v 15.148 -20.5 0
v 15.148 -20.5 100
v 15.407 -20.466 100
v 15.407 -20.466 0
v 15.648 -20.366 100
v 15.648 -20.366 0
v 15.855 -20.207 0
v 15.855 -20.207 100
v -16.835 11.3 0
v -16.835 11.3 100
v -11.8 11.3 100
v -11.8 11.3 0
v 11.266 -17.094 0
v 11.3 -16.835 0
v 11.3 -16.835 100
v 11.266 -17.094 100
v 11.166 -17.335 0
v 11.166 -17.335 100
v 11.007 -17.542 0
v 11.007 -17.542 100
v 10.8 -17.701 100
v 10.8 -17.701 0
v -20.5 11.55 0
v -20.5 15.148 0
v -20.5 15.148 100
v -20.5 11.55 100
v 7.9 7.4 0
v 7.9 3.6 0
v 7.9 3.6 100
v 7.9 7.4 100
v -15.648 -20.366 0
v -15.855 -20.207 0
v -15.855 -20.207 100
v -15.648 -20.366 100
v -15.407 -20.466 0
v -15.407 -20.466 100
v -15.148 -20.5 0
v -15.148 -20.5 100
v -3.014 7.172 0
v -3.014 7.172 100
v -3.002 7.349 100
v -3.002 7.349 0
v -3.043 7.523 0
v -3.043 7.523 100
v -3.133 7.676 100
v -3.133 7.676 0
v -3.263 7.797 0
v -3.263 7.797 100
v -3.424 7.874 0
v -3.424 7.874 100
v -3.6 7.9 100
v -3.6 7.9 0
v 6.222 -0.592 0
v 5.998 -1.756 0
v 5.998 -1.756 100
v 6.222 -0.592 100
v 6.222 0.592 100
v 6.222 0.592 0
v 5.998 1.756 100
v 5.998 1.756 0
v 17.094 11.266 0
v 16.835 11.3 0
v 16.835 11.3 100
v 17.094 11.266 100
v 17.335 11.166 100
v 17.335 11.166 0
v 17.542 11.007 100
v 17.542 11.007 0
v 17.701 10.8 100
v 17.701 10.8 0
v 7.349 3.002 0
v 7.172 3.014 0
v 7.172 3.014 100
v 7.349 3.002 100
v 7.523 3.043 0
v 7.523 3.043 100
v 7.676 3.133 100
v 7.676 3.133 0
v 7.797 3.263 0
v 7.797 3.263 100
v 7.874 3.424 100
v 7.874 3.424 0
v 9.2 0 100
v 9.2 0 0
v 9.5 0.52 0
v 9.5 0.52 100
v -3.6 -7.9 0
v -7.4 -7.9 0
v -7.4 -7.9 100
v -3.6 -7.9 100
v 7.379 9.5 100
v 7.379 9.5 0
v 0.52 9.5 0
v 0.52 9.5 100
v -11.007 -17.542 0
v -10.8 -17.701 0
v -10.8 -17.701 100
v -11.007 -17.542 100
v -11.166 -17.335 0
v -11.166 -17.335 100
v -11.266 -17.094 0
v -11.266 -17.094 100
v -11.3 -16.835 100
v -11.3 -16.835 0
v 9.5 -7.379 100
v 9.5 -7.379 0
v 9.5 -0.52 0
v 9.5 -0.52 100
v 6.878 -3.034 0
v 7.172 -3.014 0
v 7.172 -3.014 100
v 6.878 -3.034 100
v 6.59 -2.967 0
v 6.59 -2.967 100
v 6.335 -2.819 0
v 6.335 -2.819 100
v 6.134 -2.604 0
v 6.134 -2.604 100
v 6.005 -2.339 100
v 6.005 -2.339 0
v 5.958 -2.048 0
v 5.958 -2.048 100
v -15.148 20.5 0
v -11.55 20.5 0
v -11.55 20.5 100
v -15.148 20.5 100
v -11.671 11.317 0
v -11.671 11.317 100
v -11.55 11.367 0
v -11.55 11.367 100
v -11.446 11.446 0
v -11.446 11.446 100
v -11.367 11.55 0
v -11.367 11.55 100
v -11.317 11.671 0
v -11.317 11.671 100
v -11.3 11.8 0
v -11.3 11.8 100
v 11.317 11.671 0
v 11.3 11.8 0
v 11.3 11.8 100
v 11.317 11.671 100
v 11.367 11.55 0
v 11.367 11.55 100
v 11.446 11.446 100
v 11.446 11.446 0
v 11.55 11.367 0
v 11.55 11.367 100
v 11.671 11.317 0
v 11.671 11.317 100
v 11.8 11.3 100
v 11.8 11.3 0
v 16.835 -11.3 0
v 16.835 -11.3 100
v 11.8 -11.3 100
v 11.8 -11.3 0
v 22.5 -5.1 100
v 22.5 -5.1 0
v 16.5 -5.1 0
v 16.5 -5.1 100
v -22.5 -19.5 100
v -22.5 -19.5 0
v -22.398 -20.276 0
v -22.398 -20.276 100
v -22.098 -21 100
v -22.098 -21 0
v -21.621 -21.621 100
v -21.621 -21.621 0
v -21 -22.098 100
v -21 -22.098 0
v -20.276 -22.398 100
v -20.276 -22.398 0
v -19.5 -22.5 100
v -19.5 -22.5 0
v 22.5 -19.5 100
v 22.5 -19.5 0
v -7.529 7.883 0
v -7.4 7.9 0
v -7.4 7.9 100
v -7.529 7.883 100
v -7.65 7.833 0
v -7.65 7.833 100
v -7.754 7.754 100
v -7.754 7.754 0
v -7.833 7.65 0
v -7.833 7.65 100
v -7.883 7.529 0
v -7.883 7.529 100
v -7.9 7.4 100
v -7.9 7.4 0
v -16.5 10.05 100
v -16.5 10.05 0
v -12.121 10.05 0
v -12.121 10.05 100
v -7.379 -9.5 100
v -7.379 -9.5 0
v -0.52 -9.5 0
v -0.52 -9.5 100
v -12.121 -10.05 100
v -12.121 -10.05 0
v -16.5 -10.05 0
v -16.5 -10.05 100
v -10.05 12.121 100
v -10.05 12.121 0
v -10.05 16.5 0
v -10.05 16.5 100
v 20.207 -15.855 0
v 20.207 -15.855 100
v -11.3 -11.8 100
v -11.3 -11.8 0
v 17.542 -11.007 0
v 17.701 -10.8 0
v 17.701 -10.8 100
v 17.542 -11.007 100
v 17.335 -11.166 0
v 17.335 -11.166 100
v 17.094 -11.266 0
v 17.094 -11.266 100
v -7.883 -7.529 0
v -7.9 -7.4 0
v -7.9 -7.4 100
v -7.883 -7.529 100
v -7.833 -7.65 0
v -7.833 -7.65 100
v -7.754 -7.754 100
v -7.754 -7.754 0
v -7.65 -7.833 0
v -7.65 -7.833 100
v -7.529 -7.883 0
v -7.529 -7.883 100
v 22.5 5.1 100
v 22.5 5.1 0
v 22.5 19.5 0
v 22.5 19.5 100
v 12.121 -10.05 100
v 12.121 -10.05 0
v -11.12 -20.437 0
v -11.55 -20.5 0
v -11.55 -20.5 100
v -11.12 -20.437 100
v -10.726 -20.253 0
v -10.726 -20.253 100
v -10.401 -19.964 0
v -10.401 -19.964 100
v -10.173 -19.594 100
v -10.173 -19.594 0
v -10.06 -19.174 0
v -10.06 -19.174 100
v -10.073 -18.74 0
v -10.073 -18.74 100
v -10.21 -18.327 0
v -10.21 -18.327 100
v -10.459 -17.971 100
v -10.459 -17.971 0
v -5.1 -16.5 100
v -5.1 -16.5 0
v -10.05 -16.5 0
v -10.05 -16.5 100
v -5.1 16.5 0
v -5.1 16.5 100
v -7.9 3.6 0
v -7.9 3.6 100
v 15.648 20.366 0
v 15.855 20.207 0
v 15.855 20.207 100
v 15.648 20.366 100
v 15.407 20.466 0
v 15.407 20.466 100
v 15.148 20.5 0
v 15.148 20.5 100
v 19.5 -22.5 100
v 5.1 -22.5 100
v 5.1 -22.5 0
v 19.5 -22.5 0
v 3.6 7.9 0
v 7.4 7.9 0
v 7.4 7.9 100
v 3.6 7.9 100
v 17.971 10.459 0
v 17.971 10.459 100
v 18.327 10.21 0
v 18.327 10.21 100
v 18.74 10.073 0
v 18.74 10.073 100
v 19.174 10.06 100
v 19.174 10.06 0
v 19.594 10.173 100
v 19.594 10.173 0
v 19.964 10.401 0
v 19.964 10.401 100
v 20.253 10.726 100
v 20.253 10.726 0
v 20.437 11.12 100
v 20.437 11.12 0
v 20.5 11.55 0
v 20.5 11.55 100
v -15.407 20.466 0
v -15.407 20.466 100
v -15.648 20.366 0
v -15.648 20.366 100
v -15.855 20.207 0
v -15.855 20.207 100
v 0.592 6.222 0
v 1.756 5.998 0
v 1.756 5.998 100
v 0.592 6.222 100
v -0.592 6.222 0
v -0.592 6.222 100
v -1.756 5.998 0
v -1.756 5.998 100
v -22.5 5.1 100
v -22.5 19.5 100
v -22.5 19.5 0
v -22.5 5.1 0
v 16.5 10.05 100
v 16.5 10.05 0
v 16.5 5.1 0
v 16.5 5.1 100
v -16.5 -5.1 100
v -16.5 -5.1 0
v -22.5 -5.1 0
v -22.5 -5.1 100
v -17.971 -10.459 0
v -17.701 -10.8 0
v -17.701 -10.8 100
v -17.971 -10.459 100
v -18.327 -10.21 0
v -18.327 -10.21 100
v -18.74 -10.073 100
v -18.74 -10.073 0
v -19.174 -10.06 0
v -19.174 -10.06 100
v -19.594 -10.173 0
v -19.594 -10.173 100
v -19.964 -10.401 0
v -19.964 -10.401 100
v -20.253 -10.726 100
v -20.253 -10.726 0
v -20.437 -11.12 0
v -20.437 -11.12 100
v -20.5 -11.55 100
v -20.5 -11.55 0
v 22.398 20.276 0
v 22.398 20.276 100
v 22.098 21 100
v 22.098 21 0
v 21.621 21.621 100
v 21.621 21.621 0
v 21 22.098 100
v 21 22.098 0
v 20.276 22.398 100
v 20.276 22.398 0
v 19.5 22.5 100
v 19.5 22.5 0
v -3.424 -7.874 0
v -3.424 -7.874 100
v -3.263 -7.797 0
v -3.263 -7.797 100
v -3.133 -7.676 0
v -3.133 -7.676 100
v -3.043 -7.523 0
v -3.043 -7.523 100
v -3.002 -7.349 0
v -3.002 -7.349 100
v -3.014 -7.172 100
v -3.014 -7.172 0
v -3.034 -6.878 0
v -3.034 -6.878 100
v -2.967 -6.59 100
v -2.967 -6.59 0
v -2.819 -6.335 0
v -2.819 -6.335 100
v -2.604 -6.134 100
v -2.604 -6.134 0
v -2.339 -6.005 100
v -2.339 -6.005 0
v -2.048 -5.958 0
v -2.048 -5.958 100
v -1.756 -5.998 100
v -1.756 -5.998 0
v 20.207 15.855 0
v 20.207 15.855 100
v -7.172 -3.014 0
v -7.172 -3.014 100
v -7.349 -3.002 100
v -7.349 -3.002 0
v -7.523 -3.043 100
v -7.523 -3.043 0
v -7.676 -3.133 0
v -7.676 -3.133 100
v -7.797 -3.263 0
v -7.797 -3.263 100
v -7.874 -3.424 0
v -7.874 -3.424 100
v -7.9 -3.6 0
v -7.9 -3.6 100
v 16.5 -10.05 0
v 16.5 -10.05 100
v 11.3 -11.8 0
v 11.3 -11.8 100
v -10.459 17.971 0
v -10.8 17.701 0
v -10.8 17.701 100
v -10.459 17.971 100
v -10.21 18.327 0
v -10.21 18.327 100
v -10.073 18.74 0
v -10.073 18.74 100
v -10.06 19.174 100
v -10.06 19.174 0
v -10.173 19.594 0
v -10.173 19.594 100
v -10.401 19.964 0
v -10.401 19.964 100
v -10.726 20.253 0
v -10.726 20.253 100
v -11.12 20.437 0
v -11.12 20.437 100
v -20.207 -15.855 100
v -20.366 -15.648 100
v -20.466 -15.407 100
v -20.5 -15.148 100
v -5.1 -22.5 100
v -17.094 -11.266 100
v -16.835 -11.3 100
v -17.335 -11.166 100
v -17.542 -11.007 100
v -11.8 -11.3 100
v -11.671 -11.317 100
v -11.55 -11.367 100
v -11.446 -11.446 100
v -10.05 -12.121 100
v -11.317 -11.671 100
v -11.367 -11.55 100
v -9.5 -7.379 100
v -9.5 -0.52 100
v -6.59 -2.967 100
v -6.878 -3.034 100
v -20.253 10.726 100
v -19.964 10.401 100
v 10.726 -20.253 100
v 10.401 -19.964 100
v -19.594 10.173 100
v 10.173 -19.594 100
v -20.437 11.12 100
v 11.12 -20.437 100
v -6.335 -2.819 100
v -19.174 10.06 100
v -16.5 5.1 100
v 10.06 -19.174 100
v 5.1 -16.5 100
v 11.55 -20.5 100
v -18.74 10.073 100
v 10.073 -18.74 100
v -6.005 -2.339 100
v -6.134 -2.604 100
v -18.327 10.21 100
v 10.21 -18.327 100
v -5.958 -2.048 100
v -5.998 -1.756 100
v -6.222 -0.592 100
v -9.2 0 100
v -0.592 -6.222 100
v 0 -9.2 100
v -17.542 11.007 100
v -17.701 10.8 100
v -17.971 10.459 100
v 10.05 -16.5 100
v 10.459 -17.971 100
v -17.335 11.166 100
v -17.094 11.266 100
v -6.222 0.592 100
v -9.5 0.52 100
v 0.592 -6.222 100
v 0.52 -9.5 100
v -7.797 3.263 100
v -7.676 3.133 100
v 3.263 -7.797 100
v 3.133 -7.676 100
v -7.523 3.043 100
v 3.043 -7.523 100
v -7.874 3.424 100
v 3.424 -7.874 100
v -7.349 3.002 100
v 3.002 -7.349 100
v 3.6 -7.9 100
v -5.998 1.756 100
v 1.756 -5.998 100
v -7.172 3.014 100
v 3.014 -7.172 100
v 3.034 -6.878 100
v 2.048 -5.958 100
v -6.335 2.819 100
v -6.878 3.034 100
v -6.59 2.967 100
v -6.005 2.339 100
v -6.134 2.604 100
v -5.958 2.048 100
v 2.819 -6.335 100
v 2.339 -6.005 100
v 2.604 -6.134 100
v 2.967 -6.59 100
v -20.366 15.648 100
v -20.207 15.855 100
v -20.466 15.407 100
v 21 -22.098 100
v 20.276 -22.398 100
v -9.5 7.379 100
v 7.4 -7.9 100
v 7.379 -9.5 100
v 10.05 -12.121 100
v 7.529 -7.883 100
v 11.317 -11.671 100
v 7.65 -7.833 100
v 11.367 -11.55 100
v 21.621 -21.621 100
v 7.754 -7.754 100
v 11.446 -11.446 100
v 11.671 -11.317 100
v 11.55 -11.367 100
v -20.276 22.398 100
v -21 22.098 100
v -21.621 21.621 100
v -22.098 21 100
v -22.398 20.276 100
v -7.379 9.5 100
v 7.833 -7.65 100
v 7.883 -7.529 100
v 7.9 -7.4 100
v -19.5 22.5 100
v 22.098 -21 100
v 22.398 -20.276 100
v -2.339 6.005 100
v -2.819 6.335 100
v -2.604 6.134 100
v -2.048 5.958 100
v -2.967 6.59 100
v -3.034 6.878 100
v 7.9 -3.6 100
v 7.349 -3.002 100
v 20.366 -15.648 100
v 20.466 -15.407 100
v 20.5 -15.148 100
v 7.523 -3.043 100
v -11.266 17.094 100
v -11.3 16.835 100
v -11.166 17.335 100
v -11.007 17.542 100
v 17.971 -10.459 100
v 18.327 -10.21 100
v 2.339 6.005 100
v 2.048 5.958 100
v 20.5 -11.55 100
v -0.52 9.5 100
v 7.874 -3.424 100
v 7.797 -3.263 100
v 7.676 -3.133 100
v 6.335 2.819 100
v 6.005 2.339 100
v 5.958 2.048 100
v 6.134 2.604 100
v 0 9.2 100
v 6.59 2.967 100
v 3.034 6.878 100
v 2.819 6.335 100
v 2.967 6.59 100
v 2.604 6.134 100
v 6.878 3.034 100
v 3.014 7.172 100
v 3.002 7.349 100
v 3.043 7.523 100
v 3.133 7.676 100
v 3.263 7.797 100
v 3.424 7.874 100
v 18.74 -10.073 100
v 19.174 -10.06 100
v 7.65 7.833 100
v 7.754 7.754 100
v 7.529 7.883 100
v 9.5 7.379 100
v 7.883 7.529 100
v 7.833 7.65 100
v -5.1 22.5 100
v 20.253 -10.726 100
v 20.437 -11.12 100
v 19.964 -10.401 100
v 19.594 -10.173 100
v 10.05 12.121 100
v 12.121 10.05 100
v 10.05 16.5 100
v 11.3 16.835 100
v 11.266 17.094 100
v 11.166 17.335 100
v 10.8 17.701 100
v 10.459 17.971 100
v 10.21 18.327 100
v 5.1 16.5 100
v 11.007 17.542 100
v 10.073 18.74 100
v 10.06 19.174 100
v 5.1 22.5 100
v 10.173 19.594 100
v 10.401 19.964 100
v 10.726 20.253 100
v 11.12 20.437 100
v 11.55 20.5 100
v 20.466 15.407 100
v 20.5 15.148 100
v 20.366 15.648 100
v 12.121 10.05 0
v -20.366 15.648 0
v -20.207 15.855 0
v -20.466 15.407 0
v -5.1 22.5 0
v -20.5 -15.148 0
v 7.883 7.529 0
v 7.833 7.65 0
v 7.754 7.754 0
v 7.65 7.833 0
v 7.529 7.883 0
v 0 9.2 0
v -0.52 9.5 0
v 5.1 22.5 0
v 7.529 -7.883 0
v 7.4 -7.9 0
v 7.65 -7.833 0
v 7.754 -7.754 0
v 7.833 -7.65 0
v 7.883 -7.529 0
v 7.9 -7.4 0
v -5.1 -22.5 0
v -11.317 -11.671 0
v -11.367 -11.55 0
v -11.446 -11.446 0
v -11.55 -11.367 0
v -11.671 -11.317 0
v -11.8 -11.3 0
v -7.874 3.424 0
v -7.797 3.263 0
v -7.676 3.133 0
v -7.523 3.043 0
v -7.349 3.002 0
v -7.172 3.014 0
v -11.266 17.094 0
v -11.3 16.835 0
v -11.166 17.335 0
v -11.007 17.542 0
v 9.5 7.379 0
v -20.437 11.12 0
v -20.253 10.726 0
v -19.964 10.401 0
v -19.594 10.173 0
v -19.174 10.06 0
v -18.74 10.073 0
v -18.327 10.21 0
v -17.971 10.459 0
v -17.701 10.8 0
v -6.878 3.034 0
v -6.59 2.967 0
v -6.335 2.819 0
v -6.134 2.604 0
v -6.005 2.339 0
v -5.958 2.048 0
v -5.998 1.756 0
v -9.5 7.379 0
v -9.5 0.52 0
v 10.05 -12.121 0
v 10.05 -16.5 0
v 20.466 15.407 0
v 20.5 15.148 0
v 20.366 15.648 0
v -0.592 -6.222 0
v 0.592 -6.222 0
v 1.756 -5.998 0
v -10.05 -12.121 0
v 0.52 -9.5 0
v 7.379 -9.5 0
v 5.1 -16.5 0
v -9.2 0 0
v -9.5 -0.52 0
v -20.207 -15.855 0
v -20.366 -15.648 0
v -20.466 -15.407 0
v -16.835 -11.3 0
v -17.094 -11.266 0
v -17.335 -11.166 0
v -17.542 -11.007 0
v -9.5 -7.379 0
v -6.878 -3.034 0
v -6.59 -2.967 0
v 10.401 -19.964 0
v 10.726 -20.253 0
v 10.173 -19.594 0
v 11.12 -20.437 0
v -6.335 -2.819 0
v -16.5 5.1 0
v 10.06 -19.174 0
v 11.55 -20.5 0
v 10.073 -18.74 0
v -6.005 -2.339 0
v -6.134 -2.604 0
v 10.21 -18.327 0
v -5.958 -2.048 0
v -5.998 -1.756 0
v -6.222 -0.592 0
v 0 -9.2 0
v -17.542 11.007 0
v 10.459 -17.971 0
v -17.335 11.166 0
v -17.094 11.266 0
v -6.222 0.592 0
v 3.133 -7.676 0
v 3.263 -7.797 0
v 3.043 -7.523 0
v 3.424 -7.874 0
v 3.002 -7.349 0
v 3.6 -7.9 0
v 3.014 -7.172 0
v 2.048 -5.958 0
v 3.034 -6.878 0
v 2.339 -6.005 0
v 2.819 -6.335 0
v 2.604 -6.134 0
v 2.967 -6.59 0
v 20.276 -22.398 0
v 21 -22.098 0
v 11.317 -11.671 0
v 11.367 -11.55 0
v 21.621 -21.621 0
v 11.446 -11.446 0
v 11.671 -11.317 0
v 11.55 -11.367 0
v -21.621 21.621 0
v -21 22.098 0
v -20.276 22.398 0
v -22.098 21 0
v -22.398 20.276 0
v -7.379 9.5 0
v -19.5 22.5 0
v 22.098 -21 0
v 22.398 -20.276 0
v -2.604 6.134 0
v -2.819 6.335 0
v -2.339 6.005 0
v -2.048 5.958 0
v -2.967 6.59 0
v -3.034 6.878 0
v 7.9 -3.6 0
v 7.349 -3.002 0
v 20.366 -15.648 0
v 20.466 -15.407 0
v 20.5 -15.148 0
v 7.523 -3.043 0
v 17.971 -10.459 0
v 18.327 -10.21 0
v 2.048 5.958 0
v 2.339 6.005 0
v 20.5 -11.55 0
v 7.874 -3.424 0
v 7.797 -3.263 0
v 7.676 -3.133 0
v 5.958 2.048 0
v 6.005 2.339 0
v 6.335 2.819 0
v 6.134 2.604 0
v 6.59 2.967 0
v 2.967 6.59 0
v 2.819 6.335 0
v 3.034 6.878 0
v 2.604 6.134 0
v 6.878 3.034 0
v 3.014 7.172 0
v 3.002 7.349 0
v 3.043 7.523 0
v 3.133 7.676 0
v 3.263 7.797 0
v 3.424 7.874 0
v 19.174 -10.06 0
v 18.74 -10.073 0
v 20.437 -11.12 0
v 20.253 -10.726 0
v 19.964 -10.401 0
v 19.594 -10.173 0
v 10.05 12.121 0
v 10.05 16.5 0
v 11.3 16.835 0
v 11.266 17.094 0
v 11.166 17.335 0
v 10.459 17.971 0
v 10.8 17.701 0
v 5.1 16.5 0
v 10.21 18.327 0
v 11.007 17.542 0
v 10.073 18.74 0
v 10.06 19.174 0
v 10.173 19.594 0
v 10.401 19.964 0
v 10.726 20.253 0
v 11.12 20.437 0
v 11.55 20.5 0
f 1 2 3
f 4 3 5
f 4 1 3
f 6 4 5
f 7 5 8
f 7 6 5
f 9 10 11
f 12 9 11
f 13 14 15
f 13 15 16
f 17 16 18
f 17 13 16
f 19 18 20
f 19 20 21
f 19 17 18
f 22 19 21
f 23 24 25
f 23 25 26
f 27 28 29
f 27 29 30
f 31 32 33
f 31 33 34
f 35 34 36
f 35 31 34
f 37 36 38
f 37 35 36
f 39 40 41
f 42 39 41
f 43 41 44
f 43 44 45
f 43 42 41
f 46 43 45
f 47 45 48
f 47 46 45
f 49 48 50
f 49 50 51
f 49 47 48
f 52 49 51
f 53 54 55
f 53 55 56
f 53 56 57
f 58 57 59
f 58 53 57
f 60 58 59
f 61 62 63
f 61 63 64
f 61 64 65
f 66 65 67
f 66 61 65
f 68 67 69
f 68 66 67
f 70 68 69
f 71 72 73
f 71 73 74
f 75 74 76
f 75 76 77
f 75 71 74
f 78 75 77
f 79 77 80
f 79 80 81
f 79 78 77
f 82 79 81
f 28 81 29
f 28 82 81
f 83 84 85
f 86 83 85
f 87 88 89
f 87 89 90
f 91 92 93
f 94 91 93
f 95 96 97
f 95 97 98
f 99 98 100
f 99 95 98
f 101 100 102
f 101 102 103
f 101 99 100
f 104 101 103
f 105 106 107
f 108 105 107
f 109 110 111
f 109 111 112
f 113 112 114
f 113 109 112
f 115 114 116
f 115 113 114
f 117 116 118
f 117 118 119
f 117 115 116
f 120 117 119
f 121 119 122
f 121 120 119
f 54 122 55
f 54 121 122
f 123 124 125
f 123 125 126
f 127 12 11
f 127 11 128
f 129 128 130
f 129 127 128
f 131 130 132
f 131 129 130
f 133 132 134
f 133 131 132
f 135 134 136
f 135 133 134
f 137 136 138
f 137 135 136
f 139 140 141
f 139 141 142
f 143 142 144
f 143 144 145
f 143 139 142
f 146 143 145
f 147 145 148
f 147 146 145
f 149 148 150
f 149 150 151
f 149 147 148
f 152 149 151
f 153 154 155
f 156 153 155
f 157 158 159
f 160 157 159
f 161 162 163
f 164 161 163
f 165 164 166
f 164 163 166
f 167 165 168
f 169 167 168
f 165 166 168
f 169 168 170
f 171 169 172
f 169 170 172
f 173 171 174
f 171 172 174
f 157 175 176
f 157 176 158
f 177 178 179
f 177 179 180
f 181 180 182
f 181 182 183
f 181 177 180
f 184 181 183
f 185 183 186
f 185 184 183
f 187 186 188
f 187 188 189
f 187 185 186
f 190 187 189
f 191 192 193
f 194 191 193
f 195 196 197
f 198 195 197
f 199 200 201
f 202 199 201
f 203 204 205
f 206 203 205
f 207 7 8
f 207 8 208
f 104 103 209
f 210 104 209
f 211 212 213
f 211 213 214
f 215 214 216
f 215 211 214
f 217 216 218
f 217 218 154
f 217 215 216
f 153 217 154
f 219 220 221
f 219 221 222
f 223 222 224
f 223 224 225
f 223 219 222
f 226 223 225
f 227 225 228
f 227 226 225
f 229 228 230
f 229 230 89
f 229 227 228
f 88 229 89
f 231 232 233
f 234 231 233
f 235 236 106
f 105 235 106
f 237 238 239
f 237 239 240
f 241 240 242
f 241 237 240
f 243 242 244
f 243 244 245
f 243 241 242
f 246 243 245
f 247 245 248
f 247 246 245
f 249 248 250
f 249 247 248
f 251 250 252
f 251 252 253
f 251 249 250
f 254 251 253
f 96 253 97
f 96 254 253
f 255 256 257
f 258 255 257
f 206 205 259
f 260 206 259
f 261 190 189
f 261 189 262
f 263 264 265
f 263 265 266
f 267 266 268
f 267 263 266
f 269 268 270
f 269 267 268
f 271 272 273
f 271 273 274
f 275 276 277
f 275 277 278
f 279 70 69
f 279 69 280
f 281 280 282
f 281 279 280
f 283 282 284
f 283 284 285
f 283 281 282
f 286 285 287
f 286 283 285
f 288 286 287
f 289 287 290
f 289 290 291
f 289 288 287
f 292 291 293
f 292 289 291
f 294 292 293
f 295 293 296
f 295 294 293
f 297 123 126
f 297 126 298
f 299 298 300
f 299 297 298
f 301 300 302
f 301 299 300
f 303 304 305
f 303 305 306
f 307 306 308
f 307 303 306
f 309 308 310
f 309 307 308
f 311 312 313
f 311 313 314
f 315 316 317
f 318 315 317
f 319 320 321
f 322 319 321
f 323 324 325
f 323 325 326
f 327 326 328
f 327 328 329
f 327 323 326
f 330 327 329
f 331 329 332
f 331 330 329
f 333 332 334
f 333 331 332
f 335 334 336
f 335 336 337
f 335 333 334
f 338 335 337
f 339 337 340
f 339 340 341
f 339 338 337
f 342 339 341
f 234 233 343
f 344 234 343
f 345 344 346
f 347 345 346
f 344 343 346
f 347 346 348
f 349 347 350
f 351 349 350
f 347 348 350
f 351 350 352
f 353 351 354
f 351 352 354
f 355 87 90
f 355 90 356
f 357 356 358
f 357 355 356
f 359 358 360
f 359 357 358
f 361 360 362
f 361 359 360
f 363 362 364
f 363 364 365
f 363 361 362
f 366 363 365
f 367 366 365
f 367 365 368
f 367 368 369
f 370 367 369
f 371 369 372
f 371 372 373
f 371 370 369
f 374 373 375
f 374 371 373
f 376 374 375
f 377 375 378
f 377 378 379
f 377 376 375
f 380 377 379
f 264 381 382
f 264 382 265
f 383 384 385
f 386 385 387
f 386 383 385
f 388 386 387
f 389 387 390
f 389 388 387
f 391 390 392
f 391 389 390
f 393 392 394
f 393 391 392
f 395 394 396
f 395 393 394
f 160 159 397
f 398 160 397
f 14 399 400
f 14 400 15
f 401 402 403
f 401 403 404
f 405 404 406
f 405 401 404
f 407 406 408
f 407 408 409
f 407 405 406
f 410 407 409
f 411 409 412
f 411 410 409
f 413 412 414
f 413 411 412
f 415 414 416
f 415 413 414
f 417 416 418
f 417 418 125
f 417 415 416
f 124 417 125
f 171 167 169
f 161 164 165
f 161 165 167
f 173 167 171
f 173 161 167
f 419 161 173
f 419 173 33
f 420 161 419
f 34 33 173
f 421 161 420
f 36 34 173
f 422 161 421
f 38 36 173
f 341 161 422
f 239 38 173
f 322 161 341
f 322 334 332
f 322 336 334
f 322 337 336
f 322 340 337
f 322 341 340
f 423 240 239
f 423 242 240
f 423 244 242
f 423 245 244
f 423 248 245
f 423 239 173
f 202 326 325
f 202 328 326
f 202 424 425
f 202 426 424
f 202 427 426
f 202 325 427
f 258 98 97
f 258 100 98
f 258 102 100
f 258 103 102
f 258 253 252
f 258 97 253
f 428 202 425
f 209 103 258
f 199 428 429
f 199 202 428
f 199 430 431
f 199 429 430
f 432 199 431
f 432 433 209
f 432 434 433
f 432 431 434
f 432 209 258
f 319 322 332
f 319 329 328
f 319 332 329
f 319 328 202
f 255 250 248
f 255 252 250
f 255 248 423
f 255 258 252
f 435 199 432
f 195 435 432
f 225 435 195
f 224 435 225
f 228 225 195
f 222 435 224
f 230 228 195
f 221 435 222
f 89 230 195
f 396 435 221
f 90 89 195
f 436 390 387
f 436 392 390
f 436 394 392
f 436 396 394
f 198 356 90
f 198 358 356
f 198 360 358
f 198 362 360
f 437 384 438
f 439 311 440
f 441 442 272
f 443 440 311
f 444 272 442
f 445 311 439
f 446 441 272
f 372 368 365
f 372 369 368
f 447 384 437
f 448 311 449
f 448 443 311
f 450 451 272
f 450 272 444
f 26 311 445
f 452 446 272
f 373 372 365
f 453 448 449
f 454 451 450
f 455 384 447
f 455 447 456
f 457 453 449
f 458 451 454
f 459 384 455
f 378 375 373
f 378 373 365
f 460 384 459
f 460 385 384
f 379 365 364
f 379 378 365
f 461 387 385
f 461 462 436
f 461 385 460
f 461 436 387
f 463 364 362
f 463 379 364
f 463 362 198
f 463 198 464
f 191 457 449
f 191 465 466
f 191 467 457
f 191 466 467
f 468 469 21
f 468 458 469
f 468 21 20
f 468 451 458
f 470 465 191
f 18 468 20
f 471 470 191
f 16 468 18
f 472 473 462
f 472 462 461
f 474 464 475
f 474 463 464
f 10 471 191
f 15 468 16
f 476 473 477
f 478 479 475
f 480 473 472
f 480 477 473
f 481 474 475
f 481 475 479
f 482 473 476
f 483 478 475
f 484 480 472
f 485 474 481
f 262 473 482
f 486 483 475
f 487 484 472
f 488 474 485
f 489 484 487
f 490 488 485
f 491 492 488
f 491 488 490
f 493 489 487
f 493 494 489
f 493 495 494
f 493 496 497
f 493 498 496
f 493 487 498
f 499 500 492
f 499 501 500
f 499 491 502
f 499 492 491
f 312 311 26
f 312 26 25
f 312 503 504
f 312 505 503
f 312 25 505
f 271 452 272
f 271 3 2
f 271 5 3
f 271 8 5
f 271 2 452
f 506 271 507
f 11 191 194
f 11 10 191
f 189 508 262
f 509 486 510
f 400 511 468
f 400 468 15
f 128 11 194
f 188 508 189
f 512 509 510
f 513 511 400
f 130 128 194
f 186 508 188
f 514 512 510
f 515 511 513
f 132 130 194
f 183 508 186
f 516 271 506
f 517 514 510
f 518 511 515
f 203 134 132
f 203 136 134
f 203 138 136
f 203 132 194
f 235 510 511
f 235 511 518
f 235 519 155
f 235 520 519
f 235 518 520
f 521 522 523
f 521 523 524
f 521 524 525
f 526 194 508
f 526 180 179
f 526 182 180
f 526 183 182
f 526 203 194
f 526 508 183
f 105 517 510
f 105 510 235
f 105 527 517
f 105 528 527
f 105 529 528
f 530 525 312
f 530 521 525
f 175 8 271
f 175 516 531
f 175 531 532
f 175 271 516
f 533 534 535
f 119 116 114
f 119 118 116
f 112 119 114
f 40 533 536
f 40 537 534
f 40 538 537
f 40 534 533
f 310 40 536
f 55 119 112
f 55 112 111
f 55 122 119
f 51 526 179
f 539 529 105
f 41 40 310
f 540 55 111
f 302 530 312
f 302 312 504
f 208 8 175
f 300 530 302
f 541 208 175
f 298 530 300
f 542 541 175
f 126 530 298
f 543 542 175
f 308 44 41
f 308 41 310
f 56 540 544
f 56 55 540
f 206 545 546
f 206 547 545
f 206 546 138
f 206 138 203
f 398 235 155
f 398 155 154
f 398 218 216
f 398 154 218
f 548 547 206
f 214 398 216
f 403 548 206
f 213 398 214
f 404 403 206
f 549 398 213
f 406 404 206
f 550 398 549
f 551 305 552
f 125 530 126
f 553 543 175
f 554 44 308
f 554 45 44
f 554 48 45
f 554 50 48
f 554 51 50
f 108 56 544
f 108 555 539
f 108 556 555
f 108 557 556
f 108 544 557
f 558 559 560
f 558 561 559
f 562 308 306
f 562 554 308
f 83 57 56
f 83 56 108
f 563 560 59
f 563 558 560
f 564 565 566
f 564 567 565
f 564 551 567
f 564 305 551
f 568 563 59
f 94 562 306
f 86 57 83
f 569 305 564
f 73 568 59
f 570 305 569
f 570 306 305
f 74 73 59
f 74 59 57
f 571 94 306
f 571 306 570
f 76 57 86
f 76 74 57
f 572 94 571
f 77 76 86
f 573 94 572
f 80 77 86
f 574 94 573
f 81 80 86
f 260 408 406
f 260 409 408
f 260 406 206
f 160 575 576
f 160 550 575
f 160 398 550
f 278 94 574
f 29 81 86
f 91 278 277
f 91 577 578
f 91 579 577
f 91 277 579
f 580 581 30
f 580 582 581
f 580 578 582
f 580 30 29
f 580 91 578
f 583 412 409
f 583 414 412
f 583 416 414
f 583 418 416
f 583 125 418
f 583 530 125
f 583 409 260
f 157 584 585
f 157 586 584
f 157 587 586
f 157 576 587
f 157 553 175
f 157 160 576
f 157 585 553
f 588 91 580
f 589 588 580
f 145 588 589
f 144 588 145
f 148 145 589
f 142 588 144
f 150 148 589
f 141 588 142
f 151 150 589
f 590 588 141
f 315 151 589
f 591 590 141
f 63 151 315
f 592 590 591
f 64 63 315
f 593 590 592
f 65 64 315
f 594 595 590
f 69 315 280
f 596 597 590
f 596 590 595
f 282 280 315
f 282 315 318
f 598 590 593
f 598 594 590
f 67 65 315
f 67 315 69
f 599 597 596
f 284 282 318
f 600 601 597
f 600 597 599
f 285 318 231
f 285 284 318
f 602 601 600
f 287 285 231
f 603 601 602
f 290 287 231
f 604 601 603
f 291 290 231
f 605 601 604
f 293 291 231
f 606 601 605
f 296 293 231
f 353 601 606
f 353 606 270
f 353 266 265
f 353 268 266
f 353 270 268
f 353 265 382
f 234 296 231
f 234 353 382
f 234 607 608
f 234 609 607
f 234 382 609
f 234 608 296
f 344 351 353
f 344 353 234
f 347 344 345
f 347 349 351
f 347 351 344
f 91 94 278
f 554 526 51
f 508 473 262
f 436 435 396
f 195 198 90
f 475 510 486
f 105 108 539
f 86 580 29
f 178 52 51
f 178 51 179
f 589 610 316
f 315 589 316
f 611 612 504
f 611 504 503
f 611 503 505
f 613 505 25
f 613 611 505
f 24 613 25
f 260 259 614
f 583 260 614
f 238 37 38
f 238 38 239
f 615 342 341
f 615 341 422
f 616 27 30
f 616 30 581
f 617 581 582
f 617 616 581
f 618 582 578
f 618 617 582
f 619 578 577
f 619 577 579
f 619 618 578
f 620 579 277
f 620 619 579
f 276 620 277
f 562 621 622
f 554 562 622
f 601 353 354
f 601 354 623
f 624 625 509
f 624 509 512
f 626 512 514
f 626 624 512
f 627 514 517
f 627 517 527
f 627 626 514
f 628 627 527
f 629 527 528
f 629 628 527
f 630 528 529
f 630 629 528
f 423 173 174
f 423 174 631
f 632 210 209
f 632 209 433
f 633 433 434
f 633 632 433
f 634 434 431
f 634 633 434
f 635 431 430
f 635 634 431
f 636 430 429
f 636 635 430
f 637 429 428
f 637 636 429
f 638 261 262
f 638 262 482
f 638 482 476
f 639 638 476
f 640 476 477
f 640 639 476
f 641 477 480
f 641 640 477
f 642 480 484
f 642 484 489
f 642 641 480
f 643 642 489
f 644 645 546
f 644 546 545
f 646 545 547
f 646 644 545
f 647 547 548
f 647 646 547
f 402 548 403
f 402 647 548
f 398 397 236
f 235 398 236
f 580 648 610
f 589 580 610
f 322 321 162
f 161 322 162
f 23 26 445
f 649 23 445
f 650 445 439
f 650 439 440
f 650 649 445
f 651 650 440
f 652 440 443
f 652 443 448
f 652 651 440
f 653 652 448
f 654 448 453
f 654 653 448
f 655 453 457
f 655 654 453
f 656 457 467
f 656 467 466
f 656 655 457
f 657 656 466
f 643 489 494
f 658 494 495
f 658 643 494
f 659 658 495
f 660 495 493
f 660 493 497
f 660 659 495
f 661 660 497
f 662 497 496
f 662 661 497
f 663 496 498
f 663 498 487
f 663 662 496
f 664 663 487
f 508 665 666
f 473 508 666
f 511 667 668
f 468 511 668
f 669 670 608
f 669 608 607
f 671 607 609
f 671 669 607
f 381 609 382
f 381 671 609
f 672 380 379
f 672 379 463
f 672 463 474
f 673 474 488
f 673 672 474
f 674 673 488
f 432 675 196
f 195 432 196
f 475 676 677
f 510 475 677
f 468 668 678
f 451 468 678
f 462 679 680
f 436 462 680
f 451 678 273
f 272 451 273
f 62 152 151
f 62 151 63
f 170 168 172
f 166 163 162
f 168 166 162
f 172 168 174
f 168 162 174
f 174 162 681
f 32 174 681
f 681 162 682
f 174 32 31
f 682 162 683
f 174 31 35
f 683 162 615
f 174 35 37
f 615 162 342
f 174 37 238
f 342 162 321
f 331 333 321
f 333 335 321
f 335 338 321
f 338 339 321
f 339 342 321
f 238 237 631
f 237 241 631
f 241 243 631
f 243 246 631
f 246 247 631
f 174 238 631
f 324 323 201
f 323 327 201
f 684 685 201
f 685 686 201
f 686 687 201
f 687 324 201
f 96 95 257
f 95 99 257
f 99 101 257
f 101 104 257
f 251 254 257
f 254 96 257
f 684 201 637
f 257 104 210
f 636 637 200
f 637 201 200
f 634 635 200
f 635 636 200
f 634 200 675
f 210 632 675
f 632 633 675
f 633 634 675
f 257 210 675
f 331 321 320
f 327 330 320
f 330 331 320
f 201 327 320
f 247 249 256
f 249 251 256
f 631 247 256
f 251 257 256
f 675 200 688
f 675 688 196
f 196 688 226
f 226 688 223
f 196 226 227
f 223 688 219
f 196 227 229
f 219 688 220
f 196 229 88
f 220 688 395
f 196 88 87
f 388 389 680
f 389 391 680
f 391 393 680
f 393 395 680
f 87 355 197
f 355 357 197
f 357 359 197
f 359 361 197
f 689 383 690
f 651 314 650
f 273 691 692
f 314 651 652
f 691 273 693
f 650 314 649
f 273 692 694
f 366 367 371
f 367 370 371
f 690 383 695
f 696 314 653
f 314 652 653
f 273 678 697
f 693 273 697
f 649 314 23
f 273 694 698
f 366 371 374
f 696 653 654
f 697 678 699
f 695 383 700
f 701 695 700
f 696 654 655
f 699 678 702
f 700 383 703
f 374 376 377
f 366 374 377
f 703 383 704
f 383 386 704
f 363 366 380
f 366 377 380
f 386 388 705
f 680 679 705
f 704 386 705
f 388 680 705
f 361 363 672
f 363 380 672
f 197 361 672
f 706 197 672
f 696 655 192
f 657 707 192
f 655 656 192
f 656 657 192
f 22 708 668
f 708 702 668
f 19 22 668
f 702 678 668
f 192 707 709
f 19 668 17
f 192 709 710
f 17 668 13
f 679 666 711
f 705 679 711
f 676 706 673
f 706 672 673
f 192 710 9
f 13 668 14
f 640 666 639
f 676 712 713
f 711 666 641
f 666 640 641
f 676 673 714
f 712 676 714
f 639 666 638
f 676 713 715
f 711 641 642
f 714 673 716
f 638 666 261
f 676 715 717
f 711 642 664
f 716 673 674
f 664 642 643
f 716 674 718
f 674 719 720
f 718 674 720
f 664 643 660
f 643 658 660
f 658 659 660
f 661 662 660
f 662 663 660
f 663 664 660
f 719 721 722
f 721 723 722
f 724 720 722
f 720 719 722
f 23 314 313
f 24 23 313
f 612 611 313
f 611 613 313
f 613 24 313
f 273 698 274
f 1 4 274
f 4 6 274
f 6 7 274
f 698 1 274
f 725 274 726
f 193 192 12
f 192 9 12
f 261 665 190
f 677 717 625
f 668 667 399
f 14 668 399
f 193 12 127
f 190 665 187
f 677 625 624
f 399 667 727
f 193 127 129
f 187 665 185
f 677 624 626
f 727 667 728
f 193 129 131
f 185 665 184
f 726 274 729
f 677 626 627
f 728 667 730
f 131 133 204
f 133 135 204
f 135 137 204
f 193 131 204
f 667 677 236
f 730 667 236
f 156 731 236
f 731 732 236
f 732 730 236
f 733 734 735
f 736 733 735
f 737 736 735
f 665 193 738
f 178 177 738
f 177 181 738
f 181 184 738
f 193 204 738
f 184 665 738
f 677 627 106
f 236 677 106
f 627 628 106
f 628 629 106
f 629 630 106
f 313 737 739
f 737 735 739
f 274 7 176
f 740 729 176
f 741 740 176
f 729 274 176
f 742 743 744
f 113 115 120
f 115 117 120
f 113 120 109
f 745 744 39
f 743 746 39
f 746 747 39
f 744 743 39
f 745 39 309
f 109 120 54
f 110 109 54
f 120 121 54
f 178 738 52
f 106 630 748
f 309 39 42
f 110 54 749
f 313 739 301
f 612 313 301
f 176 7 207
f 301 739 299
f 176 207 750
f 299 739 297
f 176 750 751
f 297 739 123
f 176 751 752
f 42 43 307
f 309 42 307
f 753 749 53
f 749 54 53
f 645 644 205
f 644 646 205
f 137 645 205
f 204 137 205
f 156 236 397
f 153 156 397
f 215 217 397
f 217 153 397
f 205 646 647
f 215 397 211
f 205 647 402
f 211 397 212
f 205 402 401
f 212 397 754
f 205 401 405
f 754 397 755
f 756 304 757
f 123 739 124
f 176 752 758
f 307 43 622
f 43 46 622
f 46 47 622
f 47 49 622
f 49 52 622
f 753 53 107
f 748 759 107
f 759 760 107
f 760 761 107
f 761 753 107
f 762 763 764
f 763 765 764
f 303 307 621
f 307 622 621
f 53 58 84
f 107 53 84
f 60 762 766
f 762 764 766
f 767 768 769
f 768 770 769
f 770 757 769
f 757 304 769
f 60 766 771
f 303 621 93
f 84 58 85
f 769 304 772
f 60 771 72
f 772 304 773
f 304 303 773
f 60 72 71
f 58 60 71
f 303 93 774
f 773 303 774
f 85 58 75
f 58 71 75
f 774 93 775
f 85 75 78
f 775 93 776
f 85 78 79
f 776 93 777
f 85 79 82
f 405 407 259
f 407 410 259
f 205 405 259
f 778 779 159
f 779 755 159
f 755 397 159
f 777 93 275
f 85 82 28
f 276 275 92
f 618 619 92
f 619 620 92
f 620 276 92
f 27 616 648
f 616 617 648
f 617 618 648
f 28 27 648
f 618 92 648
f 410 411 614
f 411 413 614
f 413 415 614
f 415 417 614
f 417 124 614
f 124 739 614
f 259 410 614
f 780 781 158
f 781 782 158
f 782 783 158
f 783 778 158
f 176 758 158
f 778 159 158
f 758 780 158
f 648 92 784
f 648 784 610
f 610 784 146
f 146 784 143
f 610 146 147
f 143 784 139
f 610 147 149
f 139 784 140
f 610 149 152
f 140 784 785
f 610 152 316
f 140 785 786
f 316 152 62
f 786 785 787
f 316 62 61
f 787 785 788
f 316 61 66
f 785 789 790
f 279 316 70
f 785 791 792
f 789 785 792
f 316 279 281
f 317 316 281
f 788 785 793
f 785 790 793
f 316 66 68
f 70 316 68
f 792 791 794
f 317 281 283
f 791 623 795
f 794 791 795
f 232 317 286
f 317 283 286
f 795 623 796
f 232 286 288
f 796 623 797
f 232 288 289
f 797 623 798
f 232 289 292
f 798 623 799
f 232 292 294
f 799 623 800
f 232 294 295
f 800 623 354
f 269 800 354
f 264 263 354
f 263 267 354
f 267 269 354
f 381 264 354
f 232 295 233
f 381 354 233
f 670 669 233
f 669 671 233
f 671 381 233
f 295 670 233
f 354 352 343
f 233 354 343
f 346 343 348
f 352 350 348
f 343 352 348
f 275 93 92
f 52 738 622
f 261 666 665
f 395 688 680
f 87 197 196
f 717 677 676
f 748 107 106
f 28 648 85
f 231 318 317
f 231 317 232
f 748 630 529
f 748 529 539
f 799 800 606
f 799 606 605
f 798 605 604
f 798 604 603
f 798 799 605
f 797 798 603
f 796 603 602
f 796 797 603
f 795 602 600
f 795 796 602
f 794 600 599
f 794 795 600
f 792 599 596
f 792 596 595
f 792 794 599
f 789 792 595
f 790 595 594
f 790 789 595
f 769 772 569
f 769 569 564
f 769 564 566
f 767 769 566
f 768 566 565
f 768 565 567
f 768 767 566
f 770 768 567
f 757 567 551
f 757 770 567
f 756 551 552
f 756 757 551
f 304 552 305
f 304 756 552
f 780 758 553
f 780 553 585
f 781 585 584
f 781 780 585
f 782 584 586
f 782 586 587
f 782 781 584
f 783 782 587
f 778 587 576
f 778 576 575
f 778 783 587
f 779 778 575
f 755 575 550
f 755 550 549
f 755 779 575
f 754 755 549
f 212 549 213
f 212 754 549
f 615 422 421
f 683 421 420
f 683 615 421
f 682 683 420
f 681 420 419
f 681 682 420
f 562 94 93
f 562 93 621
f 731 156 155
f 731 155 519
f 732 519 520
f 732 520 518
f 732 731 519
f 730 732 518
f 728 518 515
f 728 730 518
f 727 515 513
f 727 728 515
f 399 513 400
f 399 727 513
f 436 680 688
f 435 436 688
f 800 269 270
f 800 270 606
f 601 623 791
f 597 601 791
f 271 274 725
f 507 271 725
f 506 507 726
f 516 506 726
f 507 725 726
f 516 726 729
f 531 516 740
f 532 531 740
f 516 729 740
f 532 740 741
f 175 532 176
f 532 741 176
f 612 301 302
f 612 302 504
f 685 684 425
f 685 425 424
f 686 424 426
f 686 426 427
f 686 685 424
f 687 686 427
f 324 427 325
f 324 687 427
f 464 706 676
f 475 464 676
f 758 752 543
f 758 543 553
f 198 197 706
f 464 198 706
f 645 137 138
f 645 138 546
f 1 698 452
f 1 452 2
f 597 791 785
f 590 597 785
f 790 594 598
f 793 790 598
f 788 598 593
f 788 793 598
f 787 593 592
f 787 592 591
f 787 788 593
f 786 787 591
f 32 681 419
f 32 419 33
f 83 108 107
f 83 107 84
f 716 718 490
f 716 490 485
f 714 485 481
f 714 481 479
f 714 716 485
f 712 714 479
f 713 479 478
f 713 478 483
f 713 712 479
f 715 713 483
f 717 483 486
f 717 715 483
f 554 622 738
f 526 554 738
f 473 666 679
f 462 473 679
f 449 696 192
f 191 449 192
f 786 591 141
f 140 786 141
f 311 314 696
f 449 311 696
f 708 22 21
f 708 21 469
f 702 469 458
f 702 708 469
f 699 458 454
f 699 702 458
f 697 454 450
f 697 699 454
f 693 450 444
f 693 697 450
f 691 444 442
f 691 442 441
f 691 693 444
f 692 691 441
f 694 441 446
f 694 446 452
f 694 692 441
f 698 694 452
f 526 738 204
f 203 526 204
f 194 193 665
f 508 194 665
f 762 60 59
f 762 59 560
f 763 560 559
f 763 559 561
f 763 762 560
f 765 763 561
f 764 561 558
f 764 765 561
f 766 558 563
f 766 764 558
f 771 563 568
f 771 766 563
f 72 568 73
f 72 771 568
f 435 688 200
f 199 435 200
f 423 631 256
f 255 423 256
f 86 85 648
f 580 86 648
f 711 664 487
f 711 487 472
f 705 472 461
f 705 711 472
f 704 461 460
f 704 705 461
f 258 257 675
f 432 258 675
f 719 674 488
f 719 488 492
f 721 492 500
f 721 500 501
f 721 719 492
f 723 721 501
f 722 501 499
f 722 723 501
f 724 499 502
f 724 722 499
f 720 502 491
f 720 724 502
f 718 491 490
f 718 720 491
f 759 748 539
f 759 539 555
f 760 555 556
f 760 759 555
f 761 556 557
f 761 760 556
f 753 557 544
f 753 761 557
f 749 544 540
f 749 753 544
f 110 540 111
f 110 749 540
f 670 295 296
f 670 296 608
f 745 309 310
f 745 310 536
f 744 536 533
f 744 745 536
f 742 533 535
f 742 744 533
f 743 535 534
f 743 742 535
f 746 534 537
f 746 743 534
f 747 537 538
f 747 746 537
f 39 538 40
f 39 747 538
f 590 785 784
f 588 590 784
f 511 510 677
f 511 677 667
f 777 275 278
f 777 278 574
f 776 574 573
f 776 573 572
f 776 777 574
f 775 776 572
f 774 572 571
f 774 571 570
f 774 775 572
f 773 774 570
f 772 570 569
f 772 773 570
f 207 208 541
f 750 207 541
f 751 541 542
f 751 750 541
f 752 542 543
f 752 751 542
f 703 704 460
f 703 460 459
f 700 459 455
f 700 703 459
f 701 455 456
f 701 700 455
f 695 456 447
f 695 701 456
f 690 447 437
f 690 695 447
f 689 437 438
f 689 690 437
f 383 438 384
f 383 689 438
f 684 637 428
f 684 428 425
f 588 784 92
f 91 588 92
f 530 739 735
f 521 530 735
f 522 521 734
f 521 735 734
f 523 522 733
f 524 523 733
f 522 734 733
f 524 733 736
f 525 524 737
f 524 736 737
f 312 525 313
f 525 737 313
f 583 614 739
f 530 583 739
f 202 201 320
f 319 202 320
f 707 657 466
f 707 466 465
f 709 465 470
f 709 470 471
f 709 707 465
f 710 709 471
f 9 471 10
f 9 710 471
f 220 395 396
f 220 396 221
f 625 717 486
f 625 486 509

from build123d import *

# Parameters (mm, degrees)
BOSS_EXTRU_1_DEPTH = 100


with BuildPart() as part:
    # Esquisse1 → Boss.-Extru.1 (new body)
    with BuildSketch(Plane.XY):
        with BuildLine():
            Line((22.500000043, 5.099999967), (22.500000043, 19.499999968))
            ThreePointArc((22.500000043, 19.499999968), (21.621320369, 21.621320326), (19.500000002, 22.499999981))
            Line((19.500000002, 22.499999981), (5.100000002, 22.499999981))
            Line((5.100000002, 22.499999981), (5.100000002, 16.499999976))
            Line((5.100000002, 16.499999976), (10.050000002, 16.499999976))
            Line((10.050000002, 16.499999976), (10.050000002, 12.121320348))
            Line((10.050000002, 12.121320348), (7.378679628, 9.499999975))
            Line((7.378679628, 9.499999975), (0.51961526, 9.499999975))
            Line((0.51961526, 9.499999975), (1.4e-08, 9.199999973))
            Line((1.4e-08, 9.199999973), (-0.519615231, 9.499999975))
            Line((-0.519615231, 9.499999975), (-7.3786796, 9.499999975))
            Line((-7.3786796, 9.499999975), (-10.049999998, 12.121320324))
            Line((-10.049999998, 12.121320324), (-10.049999998, 16.499999952))
            Line((-10.049999998, 16.499999952), (-5.099999998, 16.499999952))
            Line((-5.099999998, 16.499999952), (-5.099999998, 22.499999958))
            Line((-5.099999998, 22.499999958), (-19.499999998, 22.499999958))
            ThreePointArc((-19.499999998, 22.499999958), (-21.621320357, 21.621320284), (-22.500000012, 19.499999917))
            Line((-22.500000012, 19.499999917), (-22.500000012, 5.099999917))
            Line((-22.500000012, 5.099999917), (-16.500000006, 5.099999917))
            Line((-16.500000006, 5.099999917), (-16.500000006, 10.049999917))
            Line((-16.500000006, 10.049999917), (-12.121320378, 10.049999917))
            Line((-12.121320378, 10.049999917), (-9.500000005, 7.378679543))
            Line((-9.500000005, 7.378679543), (-9.500000005, 0.519615174))
            Line((-9.500000005, 0.519615174), (-9.200000003, -7.1e-08))
            Line((-9.200000003, -7.1e-08), (-9.500000005, -0.519615317))
            Line((-9.500000005, -0.519615317), (-9.500000005, -7.378679686))
            Line((-9.500000005, -7.378679686), (-12.121320354, -10.050000083))
            Line((-12.121320354, -10.050000083), (-16.499999982, -10.050000083))
            Line((-16.499999982, -10.050000083), (-16.499999982, -5.100000083))
            Line((-16.499999982, -5.100000083), (-22.499999988, -5.100000083))
            Line((-22.499999988, -5.100000083), (-22.499999988, -19.500000083))
            ThreePointArc((-22.499999988, -19.500000083), (-21.621320314, -21.621320442), (-19.499999947, -22.500000097))
            Line((-19.499999947, -22.500000097), (-5.099999947, -22.500000097))
            Line((-5.099999947, -22.500000097), (-5.099999947, -16.500000091))
            Line((-5.099999947, -16.500000091), (-10.049999947, -16.500000091))
            Line((-10.049999947, -16.500000091), (-10.049999947, -12.121320464))
            Line((-10.049999947, -12.121320464), (-7.378679573, -9.500000091))
            Line((-7.378679573, -9.500000091), (-0.519615204, -9.500000091))
            Line((-0.519615204, -9.500000091), (4.1e-08, -9.200000089))
            Line((4.1e-08, -9.200000089), (0.519615287, -9.500000091))
            Line((0.519615287, -9.500000091), (7.378679655, -9.500000091))
            Line((7.378679655, -9.500000091), (10.050000053, -12.12132044))
            Line((10.050000053, -12.12132044), (10.050000053, -16.500000068))
            Line((10.050000053, -16.500000068), (5.100000053, -16.500000068))
            Line((5.100000053, -16.500000068), (5.100000053, -22.500000073))
            Line((5.100000053, -22.500000073), (19.500000053, -22.500000073))
            ThreePointArc((19.500000053, -22.500000073), (21.621320412, -21.621320399), (22.500000067, -19.500000033))
            Line((22.500000067, -19.500000033), (22.500000067, -5.100000033))
            Line((22.500000067, -5.100000033), (16.500000061, -5.100000033))
            Line((16.500000061, -5.100000033), (16.500000061, -10.050000033))
            Line((16.500000061, -10.050000033), (12.121320433, -10.050000033))
            Line((12.121320433, -10.050000033), (9.50000006, -7.378679659))
            Line((9.50000006, -7.378679659), (9.50000006, -0.51961529))
            Line((9.50000006, -0.51961529), (9.200000058, -4.4e-08))
            Line((9.200000058, -4.4e-08), (9.50000006, 0.519615201))
            Line((9.50000006, 0.519615201), (9.50000006, 7.37867957))
            Line((9.50000006, 7.37867957), (12.12132041, 10.049999967))
            Line((12.12132041, 10.049999967), (16.500000038, 10.049999967))
            Line((16.500000038, 10.049999967), (16.500000038, 5.099999967))
            Line((16.500000038, 5.099999967), (22.500000043, 5.099999967))
        make_face()
        with BuildLine():
            Line((15.855339158, -20.207106708), (20.207106825, -15.855339041))
            ThreePointArc((20.207106825, -15.855339041), (20.4238796, -15.530915671), (20.500000069, -15.148232209))
            Line((20.500000069, -15.148232209), (20.500000069, -11.54999993))
            ThreePointArc((20.500000069, -11.54999993), (19.388228621, -10.101111187), (17.700961947, -10.79999996))
            ThreePointArc((17.700961947, -10.79999996), (17.334936545, -11.166025343), (16.83493656, -11.299999931))
            Line((16.83493656, -11.299999931), (11.800000069, -11.299999931))
            ThreePointArc((11.800000069, -11.299999931), (11.446446677, -11.446446542), (11.300000069, -11.799999935))
            Line((11.300000069, -11.799999935), (11.300000069, -16.834936434))
            ThreePointArc((11.300000069, -16.834936434), (11.166025484, -17.334936416), (10.800000106, -17.700961817))
            ThreePointArc((10.800000106, -17.700961817), (10.101111348, -19.388228497), (11.550000101, -20.499999933))
            Line((11.550000101, -20.499999933), (15.14823238, -20.499999933))
            ThreePointArc((15.14823238, -20.499999933), (15.530915811, -20.423879462), (15.855339158, -20.207106708))
        make_face(mode=Mode.SUBTRACT)
        with BuildLine():
            Line((-20.499999933, -11.550000112), (-20.499999933, -15.148232391))
            ThreePointArc((-20.499999933, -15.148232391), (-20.423879462, -15.530915822), (-20.207106708, -15.855339169))
            Line((-20.207106708, -15.855339169), (-15.855339041, -20.207106836))
            ThreePointArc((-15.855339041, -20.207106836), (-15.530915692, -20.423879587), (-15.14823226, -20.500000055))
            Line((-15.14823226, -20.500000055), (-11.549999982, -20.500000055))
            ThreePointArc((-11.549999982, -20.500000055), (-10.101111238, -19.388228606), (-10.800000011, -17.700961932))
            ThreePointArc((-10.800000011, -17.700961932), (-11.166025359, -17.334936533), (-11.299999931, -16.834936571))
            Line((-11.299999931, -16.834936571), (-11.299999931, -11.80000008))
            ThreePointArc((-11.299999931, -11.80000008), (-11.446446542, -11.446446688), (-11.799999935, -11.30000008))
            Line((-11.799999935, -11.30000008), (-16.834936426, -11.30000008))
            ThreePointArc((-16.834936426, -11.30000008), (-17.334936412, -11.166025497), (-17.700961817, -10.800000117))
            ThreePointArc((-17.700961817, -10.800000117), (-19.388228497, -10.101111359), (-20.499999933, -11.550000112))
        make_face(mode=Mode.SUBTRACT)
        with BuildLine():
            Line((-15.85533915, 20.20710669), (-20.207106817, 15.855339024))
            ThreePointArc((-20.207106817, 15.855339024), (-20.423879568, 15.530915675), (-20.500000035, 15.148232242))
            Line((-20.500000035, 15.148232242), (-20.500000035, 11.549999964))
            ThreePointArc((-20.500000035, 11.549999964), (-19.388228587, 10.101111221), (-17.700961913, 10.799999993))
            ThreePointArc((-17.700961913, 10.799999993), (-17.334936511, 11.166025377), (-16.834936526, 11.299999965))
            Line((-16.834936526, 11.299999965), (-11.800000035, 11.299999965))
            ThreePointArc((-11.800000035, 11.299999965), (-11.446446643, 11.446446576), (-11.300000035, 11.799999969))
            Line((-11.300000035, 11.799999969), (-11.300000035, 16.834936459))
            ThreePointArc((-11.300000035, 16.834936459), (-11.16602545, 17.334936413), (-10.800000097, 17.7009618))
            ThreePointArc((-10.800000097, 17.7009618), (-10.10111134, 19.38822848), (-11.550000093, 20.499999915))
            Line((-11.550000093, 20.499999915), (-15.148232371, 20.499999915))
            ThreePointArc((-15.148232371, 20.499999915), (-15.530915803, 20.423879445), (-15.85533915, 20.20710669))
        make_face(mode=Mode.SUBTRACT)
        with BuildLine():
            Line((-3.600000106, 7.899999961), (-7.399999998, 7.899999961))
            ThreePointArc((-7.399999998, 7.899999961), (-7.753553388, 7.75355335), (-7.899999996, 7.399999959))
            Line((-7.899999996, 7.399999959), (-7.899999996, 3.600000067))
            ThreePointArc((-7.899999996, 3.600000067), (-7.676191867, 3.132581845), (-7.171734284, 3.013870341))
            ThreePointArc((-7.171734284, 3.013870341), (-6.226759165, 2.719151967), (-5.99823974, 1.75602385))
            ThreePointArc((-5.99823974, 1.75602385), (-6.249999979, -2.2e-08), (-5.998239727, -1.756023893))
            ThreePointArc((-5.998239727, -1.756023893), (-6.226759144, -2.719152011), (-7.171734261, -3.013870394))
            ThreePointArc((-7.171734261, -3.013870394), (-7.676191842, -3.132581902), (-7.899999967, -3.600000126))
            Line((-7.899999967, -3.600000126), (-7.899999967, -7.400000018))
            ThreePointArc((-7.899999967, -7.400000018), (-7.753553356, -7.753553408), (-7.399999965, -7.900000016))
            Line((-7.399999965, -7.900000016), (-3.600000073, -7.900000016))
            ThreePointArc((-3.600000073, -7.900000016), (-3.132581851, -7.676191887), (-3.013870347, -7.171734304))
            ThreePointArc((-3.013870347, -7.171734304), (-2.719151972, -6.226759185), (-1.756023856, -5.99823976))
            ThreePointArc((-1.756023856, -5.99823976), (2.8e-08, -6.25), (1.756023909, -5.998239744))
            ThreePointArc((1.756023909, -5.998239744), (2.719152028, -6.226759161), (3.013870411, -7.171734278))
            ThreePointArc((3.013870411, -7.171734278), (3.132581919, -7.676191859), (3.600000143, -7.899999984))
            Line((3.600000143, -7.899999984), (7.400000035, -7.899999984))
            ThreePointArc((7.400000035, -7.899999984), (7.75355342, -7.753553361), (7.900000016, -7.399999965))
            Line((7.900000016, -7.399999965), (7.900000016, -3.600000073))
            ThreePointArc((7.900000016, -3.600000073), (7.676191887, -3.132581851), (7.171734305, -3.013870347))
            ThreePointArc((7.171734305, -3.013870347), (6.226759185, -2.719151972), (5.99823976, -1.756023856))
            ThreePointArc((5.99823976, -1.756023856), (6.25, 2.8e-08), (5.998239744, 1.756023909))
            ThreePointArc((5.998239744, 1.756023909), (6.226759161, 2.719152028), (7.171734278, 3.013870411))
            ThreePointArc((7.171734278, 3.013870411), (7.676191859, 3.132581919), (7.899999984, 3.600000143))
            Line((7.899999984, 3.600000143), (7.899999984, 7.400000035))
            ThreePointArc((7.899999984, 7.400000035), (7.753553347, 7.753553403), (7.399999956, 7.899999985))
            Line((7.399999956, 7.899999985), (3.600000064, 7.899999985))
            ThreePointArc((3.600000064, 7.899999985), (3.132581842, 7.676191856), (3.013870338, 7.171734274))
            ThreePointArc((3.013870338, 7.171734274), (2.719151963, 6.226759154), (1.756023847, 5.998239729))
            ThreePointArc((1.756023847, 5.998239729), (-1.3e-08, 6.249999968), (-1.756023872, 5.998239721))
            ThreePointArc((-1.756023872, 5.998239721), (-2.719151991, 6.226759139), (-3.013870374, 7.171734255))
            ThreePointArc((-3.013870374, 7.171734255), (-3.132581882, 7.676191836), (-3.600000106, 7.899999961))
        make_face(mode=Mode.SUBTRACT)
        with BuildLine():
            Line((11.299999964, 16.83493656), (11.299999964, 11.800000069))
            ThreePointArc((11.299999964, 11.800000069), (11.446446575, 11.446446677), (11.799999969, 11.300000069))
            Line((11.799999969, 11.300000069), (16.834936459, 11.300000069))
            ThreePointArc((16.834936459, 11.300000069), (17.334936446, 11.166025486), (17.700961851, 10.800000106))
            ThreePointArc((17.700961851, 10.800000106), (19.388228531, 10.101111348), (20.499999967, 11.550000101))
            Line((20.499999967, 11.550000101), (20.499999967, 15.14823238))
            ThreePointArc((20.499999967, 15.14823238), (20.423879472, 15.530915844), (20.207106671, 15.855339203))
            Line((20.207106671, 15.855339203), (15.855339024, 20.207106851))
            ThreePointArc((15.855339024, 20.207106851), (15.530915675, 20.423879602), (15.148232242, 20.500000069))
            Line((15.148232242, 20.500000069), (11.549999964, 20.500000069))
            ThreePointArc((11.549999964, 20.500000069), (10.10111122, 19.388228621), (10.799999993, 17.700961947))
            ThreePointArc((10.799999993, 17.700961947), (11.166025377, 17.334936545), (11.299999964, 16.83493656))
        make_face(mode=Mode.SUBTRACT)
    extrude(amount=BOSS_EXTRU_1_DEPTH)


solid = part.part
